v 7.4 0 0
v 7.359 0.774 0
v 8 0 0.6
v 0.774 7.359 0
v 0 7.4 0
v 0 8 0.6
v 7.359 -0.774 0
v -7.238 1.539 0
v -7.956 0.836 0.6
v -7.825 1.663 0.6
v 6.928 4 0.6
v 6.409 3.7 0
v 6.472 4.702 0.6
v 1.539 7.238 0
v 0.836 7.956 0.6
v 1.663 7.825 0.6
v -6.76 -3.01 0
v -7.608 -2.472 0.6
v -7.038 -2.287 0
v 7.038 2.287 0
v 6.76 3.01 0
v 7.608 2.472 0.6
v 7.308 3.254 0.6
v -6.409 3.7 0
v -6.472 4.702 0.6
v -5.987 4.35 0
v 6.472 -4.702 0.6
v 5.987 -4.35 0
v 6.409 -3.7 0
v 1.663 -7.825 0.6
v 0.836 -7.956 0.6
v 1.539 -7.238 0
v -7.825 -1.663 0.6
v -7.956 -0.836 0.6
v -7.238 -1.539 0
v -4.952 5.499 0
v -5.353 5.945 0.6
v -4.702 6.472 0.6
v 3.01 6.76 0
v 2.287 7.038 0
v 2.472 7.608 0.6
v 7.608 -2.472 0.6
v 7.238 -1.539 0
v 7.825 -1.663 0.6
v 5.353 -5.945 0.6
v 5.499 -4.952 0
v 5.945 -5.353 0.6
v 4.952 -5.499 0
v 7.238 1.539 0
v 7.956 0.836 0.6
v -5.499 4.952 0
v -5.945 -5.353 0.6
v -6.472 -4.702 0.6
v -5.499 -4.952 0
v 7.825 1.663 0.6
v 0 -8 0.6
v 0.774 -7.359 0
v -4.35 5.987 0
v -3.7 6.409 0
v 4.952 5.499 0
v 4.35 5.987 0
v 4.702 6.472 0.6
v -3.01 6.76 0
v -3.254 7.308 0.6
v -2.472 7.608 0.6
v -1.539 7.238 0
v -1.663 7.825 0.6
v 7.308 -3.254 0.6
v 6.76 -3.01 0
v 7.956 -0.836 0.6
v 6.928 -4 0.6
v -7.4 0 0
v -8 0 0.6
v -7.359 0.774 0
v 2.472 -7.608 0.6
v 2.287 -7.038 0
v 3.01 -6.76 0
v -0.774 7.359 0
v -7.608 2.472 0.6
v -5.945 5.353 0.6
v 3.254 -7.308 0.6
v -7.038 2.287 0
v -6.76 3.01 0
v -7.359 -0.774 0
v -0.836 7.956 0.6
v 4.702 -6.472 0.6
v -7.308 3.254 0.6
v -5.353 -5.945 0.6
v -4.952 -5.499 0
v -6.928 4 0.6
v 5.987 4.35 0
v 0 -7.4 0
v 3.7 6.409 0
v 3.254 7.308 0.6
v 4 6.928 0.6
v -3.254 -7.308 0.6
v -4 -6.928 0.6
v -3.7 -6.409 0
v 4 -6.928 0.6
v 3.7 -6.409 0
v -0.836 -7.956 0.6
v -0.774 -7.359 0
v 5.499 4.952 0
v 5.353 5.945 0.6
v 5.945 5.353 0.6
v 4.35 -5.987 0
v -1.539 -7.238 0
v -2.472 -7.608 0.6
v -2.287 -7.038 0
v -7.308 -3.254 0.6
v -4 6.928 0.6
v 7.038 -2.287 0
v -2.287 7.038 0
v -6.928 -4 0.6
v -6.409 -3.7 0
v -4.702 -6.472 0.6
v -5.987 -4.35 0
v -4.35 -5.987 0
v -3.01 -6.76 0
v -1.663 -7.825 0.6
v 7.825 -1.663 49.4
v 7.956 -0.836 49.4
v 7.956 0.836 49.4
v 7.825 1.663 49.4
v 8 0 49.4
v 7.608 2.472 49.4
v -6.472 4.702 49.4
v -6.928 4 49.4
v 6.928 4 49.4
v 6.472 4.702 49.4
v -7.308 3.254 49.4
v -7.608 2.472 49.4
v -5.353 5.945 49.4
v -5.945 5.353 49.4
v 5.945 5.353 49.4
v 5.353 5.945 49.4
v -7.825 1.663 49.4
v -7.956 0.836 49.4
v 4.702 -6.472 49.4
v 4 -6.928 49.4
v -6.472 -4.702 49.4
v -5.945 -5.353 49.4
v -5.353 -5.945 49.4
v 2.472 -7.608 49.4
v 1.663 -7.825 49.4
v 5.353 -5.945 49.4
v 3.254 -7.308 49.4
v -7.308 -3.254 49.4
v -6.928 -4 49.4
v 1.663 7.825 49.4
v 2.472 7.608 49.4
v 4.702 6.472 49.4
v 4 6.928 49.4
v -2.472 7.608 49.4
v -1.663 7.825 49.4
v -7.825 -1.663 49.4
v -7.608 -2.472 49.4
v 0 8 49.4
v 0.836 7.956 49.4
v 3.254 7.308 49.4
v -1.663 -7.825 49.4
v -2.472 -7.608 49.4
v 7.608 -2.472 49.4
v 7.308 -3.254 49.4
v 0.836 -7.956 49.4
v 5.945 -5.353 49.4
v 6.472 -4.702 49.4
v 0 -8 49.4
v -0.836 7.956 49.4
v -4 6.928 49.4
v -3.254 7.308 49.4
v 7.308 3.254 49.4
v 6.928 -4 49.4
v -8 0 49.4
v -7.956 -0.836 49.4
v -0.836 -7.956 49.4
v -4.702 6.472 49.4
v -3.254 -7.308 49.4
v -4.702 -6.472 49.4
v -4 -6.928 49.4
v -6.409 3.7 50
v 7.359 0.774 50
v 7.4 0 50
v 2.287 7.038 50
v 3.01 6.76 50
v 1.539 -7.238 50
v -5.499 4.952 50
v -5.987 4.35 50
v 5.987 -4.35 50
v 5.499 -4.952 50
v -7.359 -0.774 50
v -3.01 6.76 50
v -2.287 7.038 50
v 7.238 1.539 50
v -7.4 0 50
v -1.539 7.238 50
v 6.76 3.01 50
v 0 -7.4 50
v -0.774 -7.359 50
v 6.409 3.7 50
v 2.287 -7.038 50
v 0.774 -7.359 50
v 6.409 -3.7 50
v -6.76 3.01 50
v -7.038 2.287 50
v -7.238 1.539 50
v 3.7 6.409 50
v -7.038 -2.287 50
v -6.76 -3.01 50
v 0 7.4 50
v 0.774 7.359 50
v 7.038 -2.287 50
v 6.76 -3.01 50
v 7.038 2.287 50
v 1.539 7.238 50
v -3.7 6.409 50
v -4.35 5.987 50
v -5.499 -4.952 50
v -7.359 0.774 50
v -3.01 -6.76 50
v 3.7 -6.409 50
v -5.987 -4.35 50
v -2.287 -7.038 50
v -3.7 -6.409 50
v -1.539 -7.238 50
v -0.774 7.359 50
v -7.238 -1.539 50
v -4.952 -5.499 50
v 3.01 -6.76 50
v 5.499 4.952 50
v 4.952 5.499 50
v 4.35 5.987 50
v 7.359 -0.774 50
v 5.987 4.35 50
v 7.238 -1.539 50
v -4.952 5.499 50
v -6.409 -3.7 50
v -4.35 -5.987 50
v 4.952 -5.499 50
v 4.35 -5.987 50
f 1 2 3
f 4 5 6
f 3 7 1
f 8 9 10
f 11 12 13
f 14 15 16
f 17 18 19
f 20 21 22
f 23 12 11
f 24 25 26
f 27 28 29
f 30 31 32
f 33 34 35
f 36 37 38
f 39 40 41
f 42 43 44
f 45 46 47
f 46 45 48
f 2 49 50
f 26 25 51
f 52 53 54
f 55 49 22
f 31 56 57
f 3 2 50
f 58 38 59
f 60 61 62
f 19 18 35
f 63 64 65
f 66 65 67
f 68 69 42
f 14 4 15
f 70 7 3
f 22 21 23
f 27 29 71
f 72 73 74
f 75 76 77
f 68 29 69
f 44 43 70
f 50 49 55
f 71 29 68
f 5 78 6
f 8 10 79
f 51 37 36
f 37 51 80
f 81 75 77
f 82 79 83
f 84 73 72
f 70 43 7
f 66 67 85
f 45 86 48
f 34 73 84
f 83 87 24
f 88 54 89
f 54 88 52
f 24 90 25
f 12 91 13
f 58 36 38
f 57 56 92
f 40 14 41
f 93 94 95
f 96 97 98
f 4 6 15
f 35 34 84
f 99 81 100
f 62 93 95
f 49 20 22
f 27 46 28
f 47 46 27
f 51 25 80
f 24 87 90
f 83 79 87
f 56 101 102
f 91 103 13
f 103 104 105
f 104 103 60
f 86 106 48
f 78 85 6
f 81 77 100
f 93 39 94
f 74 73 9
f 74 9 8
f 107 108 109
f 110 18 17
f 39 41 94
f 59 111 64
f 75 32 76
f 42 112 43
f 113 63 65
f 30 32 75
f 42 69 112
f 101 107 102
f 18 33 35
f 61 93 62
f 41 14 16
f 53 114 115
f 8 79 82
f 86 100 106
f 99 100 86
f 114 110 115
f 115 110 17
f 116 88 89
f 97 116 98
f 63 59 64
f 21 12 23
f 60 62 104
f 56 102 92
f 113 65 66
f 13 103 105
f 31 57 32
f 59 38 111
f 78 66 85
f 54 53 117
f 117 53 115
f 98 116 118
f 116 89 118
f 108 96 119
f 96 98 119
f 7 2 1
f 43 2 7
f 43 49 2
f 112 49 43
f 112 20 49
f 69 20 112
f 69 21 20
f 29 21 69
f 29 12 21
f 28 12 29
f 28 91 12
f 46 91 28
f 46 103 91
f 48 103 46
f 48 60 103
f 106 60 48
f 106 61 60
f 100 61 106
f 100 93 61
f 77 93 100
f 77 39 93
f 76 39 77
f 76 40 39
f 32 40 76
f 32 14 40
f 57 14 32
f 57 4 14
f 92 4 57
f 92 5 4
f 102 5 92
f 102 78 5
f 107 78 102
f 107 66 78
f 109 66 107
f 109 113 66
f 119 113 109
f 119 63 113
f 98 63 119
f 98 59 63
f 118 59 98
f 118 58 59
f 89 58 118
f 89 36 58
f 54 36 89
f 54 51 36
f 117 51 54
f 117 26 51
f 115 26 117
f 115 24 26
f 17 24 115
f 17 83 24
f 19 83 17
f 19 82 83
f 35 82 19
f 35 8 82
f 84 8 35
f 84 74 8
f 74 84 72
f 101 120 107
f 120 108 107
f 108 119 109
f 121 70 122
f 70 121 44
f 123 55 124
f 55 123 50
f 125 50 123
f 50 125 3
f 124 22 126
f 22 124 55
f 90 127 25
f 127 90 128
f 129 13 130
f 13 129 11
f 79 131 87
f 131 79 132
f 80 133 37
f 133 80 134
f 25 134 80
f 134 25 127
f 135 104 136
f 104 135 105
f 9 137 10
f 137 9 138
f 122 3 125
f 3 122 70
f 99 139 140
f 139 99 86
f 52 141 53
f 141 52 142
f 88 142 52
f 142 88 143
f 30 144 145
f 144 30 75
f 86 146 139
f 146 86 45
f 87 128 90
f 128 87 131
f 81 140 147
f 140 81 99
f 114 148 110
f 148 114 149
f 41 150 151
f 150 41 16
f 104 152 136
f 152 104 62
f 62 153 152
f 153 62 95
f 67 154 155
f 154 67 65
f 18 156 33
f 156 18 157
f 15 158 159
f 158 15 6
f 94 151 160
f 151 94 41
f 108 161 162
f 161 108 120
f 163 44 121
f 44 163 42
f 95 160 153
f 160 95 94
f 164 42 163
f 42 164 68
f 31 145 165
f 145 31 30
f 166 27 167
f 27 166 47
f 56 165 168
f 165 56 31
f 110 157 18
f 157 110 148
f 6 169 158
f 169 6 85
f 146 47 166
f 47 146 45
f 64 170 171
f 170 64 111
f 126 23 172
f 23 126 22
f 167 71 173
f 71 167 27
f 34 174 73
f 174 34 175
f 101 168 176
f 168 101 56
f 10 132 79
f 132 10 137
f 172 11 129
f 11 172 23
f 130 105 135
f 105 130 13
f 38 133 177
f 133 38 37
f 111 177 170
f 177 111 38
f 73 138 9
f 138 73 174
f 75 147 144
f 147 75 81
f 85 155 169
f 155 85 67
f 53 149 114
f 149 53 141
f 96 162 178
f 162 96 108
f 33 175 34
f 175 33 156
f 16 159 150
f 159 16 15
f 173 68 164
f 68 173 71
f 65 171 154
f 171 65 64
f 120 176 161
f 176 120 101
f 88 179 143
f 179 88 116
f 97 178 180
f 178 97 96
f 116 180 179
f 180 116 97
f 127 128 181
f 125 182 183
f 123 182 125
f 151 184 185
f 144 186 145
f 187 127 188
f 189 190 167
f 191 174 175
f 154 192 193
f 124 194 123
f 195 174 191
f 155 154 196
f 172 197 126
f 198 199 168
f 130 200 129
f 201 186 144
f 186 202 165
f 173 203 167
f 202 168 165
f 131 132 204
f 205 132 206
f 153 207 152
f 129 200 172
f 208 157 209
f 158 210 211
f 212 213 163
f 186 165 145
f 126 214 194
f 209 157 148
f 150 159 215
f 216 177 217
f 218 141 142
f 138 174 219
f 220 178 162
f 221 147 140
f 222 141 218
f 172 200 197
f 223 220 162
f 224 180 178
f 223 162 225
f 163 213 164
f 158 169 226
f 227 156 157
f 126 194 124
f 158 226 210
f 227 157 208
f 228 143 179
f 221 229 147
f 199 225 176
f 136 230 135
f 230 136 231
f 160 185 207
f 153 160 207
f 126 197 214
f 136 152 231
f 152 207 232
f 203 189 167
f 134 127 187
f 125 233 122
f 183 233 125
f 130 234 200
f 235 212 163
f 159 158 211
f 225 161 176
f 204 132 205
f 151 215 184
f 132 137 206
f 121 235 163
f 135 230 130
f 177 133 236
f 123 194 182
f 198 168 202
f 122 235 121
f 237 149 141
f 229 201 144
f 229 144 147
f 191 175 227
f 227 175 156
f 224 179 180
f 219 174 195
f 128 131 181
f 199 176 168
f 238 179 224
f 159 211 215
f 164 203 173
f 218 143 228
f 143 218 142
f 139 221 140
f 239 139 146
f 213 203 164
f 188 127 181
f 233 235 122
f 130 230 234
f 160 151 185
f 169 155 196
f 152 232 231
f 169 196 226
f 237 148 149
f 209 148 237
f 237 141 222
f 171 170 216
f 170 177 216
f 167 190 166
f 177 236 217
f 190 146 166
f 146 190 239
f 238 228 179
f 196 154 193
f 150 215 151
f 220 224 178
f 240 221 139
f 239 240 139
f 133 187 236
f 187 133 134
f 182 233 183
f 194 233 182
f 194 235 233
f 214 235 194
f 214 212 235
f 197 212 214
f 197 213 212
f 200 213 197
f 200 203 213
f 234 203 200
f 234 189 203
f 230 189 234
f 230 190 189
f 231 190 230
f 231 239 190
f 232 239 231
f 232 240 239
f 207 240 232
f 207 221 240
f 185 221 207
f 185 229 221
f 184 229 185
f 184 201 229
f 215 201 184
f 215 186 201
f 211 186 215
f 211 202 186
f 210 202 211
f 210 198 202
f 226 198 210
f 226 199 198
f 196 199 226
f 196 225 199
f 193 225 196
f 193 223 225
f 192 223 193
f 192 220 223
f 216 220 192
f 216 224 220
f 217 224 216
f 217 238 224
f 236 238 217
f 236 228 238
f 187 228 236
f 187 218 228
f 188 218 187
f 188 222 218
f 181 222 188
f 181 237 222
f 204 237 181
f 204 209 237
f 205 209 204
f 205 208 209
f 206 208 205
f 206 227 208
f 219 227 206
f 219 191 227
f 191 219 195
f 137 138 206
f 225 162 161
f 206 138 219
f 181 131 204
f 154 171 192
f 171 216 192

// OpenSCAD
// Chamfered dowel pin.
$fn = 60;
eps = 0.02;
diameter = 16;
length = 50;
chamfer = 0.6;
union() {
    cylinder(d1 = diameter - 2 * chamfer, d2 = diameter, h = chamfer);
    translate([0, 0, chamfer]) cylinder(d = diameter, h = length - 2 * chamfer);
    translate([0, 0, length - chamfer]) cylinder(d1 = diameter, d2 = diameter - 2 * chamfer, h = chamfer);
}
